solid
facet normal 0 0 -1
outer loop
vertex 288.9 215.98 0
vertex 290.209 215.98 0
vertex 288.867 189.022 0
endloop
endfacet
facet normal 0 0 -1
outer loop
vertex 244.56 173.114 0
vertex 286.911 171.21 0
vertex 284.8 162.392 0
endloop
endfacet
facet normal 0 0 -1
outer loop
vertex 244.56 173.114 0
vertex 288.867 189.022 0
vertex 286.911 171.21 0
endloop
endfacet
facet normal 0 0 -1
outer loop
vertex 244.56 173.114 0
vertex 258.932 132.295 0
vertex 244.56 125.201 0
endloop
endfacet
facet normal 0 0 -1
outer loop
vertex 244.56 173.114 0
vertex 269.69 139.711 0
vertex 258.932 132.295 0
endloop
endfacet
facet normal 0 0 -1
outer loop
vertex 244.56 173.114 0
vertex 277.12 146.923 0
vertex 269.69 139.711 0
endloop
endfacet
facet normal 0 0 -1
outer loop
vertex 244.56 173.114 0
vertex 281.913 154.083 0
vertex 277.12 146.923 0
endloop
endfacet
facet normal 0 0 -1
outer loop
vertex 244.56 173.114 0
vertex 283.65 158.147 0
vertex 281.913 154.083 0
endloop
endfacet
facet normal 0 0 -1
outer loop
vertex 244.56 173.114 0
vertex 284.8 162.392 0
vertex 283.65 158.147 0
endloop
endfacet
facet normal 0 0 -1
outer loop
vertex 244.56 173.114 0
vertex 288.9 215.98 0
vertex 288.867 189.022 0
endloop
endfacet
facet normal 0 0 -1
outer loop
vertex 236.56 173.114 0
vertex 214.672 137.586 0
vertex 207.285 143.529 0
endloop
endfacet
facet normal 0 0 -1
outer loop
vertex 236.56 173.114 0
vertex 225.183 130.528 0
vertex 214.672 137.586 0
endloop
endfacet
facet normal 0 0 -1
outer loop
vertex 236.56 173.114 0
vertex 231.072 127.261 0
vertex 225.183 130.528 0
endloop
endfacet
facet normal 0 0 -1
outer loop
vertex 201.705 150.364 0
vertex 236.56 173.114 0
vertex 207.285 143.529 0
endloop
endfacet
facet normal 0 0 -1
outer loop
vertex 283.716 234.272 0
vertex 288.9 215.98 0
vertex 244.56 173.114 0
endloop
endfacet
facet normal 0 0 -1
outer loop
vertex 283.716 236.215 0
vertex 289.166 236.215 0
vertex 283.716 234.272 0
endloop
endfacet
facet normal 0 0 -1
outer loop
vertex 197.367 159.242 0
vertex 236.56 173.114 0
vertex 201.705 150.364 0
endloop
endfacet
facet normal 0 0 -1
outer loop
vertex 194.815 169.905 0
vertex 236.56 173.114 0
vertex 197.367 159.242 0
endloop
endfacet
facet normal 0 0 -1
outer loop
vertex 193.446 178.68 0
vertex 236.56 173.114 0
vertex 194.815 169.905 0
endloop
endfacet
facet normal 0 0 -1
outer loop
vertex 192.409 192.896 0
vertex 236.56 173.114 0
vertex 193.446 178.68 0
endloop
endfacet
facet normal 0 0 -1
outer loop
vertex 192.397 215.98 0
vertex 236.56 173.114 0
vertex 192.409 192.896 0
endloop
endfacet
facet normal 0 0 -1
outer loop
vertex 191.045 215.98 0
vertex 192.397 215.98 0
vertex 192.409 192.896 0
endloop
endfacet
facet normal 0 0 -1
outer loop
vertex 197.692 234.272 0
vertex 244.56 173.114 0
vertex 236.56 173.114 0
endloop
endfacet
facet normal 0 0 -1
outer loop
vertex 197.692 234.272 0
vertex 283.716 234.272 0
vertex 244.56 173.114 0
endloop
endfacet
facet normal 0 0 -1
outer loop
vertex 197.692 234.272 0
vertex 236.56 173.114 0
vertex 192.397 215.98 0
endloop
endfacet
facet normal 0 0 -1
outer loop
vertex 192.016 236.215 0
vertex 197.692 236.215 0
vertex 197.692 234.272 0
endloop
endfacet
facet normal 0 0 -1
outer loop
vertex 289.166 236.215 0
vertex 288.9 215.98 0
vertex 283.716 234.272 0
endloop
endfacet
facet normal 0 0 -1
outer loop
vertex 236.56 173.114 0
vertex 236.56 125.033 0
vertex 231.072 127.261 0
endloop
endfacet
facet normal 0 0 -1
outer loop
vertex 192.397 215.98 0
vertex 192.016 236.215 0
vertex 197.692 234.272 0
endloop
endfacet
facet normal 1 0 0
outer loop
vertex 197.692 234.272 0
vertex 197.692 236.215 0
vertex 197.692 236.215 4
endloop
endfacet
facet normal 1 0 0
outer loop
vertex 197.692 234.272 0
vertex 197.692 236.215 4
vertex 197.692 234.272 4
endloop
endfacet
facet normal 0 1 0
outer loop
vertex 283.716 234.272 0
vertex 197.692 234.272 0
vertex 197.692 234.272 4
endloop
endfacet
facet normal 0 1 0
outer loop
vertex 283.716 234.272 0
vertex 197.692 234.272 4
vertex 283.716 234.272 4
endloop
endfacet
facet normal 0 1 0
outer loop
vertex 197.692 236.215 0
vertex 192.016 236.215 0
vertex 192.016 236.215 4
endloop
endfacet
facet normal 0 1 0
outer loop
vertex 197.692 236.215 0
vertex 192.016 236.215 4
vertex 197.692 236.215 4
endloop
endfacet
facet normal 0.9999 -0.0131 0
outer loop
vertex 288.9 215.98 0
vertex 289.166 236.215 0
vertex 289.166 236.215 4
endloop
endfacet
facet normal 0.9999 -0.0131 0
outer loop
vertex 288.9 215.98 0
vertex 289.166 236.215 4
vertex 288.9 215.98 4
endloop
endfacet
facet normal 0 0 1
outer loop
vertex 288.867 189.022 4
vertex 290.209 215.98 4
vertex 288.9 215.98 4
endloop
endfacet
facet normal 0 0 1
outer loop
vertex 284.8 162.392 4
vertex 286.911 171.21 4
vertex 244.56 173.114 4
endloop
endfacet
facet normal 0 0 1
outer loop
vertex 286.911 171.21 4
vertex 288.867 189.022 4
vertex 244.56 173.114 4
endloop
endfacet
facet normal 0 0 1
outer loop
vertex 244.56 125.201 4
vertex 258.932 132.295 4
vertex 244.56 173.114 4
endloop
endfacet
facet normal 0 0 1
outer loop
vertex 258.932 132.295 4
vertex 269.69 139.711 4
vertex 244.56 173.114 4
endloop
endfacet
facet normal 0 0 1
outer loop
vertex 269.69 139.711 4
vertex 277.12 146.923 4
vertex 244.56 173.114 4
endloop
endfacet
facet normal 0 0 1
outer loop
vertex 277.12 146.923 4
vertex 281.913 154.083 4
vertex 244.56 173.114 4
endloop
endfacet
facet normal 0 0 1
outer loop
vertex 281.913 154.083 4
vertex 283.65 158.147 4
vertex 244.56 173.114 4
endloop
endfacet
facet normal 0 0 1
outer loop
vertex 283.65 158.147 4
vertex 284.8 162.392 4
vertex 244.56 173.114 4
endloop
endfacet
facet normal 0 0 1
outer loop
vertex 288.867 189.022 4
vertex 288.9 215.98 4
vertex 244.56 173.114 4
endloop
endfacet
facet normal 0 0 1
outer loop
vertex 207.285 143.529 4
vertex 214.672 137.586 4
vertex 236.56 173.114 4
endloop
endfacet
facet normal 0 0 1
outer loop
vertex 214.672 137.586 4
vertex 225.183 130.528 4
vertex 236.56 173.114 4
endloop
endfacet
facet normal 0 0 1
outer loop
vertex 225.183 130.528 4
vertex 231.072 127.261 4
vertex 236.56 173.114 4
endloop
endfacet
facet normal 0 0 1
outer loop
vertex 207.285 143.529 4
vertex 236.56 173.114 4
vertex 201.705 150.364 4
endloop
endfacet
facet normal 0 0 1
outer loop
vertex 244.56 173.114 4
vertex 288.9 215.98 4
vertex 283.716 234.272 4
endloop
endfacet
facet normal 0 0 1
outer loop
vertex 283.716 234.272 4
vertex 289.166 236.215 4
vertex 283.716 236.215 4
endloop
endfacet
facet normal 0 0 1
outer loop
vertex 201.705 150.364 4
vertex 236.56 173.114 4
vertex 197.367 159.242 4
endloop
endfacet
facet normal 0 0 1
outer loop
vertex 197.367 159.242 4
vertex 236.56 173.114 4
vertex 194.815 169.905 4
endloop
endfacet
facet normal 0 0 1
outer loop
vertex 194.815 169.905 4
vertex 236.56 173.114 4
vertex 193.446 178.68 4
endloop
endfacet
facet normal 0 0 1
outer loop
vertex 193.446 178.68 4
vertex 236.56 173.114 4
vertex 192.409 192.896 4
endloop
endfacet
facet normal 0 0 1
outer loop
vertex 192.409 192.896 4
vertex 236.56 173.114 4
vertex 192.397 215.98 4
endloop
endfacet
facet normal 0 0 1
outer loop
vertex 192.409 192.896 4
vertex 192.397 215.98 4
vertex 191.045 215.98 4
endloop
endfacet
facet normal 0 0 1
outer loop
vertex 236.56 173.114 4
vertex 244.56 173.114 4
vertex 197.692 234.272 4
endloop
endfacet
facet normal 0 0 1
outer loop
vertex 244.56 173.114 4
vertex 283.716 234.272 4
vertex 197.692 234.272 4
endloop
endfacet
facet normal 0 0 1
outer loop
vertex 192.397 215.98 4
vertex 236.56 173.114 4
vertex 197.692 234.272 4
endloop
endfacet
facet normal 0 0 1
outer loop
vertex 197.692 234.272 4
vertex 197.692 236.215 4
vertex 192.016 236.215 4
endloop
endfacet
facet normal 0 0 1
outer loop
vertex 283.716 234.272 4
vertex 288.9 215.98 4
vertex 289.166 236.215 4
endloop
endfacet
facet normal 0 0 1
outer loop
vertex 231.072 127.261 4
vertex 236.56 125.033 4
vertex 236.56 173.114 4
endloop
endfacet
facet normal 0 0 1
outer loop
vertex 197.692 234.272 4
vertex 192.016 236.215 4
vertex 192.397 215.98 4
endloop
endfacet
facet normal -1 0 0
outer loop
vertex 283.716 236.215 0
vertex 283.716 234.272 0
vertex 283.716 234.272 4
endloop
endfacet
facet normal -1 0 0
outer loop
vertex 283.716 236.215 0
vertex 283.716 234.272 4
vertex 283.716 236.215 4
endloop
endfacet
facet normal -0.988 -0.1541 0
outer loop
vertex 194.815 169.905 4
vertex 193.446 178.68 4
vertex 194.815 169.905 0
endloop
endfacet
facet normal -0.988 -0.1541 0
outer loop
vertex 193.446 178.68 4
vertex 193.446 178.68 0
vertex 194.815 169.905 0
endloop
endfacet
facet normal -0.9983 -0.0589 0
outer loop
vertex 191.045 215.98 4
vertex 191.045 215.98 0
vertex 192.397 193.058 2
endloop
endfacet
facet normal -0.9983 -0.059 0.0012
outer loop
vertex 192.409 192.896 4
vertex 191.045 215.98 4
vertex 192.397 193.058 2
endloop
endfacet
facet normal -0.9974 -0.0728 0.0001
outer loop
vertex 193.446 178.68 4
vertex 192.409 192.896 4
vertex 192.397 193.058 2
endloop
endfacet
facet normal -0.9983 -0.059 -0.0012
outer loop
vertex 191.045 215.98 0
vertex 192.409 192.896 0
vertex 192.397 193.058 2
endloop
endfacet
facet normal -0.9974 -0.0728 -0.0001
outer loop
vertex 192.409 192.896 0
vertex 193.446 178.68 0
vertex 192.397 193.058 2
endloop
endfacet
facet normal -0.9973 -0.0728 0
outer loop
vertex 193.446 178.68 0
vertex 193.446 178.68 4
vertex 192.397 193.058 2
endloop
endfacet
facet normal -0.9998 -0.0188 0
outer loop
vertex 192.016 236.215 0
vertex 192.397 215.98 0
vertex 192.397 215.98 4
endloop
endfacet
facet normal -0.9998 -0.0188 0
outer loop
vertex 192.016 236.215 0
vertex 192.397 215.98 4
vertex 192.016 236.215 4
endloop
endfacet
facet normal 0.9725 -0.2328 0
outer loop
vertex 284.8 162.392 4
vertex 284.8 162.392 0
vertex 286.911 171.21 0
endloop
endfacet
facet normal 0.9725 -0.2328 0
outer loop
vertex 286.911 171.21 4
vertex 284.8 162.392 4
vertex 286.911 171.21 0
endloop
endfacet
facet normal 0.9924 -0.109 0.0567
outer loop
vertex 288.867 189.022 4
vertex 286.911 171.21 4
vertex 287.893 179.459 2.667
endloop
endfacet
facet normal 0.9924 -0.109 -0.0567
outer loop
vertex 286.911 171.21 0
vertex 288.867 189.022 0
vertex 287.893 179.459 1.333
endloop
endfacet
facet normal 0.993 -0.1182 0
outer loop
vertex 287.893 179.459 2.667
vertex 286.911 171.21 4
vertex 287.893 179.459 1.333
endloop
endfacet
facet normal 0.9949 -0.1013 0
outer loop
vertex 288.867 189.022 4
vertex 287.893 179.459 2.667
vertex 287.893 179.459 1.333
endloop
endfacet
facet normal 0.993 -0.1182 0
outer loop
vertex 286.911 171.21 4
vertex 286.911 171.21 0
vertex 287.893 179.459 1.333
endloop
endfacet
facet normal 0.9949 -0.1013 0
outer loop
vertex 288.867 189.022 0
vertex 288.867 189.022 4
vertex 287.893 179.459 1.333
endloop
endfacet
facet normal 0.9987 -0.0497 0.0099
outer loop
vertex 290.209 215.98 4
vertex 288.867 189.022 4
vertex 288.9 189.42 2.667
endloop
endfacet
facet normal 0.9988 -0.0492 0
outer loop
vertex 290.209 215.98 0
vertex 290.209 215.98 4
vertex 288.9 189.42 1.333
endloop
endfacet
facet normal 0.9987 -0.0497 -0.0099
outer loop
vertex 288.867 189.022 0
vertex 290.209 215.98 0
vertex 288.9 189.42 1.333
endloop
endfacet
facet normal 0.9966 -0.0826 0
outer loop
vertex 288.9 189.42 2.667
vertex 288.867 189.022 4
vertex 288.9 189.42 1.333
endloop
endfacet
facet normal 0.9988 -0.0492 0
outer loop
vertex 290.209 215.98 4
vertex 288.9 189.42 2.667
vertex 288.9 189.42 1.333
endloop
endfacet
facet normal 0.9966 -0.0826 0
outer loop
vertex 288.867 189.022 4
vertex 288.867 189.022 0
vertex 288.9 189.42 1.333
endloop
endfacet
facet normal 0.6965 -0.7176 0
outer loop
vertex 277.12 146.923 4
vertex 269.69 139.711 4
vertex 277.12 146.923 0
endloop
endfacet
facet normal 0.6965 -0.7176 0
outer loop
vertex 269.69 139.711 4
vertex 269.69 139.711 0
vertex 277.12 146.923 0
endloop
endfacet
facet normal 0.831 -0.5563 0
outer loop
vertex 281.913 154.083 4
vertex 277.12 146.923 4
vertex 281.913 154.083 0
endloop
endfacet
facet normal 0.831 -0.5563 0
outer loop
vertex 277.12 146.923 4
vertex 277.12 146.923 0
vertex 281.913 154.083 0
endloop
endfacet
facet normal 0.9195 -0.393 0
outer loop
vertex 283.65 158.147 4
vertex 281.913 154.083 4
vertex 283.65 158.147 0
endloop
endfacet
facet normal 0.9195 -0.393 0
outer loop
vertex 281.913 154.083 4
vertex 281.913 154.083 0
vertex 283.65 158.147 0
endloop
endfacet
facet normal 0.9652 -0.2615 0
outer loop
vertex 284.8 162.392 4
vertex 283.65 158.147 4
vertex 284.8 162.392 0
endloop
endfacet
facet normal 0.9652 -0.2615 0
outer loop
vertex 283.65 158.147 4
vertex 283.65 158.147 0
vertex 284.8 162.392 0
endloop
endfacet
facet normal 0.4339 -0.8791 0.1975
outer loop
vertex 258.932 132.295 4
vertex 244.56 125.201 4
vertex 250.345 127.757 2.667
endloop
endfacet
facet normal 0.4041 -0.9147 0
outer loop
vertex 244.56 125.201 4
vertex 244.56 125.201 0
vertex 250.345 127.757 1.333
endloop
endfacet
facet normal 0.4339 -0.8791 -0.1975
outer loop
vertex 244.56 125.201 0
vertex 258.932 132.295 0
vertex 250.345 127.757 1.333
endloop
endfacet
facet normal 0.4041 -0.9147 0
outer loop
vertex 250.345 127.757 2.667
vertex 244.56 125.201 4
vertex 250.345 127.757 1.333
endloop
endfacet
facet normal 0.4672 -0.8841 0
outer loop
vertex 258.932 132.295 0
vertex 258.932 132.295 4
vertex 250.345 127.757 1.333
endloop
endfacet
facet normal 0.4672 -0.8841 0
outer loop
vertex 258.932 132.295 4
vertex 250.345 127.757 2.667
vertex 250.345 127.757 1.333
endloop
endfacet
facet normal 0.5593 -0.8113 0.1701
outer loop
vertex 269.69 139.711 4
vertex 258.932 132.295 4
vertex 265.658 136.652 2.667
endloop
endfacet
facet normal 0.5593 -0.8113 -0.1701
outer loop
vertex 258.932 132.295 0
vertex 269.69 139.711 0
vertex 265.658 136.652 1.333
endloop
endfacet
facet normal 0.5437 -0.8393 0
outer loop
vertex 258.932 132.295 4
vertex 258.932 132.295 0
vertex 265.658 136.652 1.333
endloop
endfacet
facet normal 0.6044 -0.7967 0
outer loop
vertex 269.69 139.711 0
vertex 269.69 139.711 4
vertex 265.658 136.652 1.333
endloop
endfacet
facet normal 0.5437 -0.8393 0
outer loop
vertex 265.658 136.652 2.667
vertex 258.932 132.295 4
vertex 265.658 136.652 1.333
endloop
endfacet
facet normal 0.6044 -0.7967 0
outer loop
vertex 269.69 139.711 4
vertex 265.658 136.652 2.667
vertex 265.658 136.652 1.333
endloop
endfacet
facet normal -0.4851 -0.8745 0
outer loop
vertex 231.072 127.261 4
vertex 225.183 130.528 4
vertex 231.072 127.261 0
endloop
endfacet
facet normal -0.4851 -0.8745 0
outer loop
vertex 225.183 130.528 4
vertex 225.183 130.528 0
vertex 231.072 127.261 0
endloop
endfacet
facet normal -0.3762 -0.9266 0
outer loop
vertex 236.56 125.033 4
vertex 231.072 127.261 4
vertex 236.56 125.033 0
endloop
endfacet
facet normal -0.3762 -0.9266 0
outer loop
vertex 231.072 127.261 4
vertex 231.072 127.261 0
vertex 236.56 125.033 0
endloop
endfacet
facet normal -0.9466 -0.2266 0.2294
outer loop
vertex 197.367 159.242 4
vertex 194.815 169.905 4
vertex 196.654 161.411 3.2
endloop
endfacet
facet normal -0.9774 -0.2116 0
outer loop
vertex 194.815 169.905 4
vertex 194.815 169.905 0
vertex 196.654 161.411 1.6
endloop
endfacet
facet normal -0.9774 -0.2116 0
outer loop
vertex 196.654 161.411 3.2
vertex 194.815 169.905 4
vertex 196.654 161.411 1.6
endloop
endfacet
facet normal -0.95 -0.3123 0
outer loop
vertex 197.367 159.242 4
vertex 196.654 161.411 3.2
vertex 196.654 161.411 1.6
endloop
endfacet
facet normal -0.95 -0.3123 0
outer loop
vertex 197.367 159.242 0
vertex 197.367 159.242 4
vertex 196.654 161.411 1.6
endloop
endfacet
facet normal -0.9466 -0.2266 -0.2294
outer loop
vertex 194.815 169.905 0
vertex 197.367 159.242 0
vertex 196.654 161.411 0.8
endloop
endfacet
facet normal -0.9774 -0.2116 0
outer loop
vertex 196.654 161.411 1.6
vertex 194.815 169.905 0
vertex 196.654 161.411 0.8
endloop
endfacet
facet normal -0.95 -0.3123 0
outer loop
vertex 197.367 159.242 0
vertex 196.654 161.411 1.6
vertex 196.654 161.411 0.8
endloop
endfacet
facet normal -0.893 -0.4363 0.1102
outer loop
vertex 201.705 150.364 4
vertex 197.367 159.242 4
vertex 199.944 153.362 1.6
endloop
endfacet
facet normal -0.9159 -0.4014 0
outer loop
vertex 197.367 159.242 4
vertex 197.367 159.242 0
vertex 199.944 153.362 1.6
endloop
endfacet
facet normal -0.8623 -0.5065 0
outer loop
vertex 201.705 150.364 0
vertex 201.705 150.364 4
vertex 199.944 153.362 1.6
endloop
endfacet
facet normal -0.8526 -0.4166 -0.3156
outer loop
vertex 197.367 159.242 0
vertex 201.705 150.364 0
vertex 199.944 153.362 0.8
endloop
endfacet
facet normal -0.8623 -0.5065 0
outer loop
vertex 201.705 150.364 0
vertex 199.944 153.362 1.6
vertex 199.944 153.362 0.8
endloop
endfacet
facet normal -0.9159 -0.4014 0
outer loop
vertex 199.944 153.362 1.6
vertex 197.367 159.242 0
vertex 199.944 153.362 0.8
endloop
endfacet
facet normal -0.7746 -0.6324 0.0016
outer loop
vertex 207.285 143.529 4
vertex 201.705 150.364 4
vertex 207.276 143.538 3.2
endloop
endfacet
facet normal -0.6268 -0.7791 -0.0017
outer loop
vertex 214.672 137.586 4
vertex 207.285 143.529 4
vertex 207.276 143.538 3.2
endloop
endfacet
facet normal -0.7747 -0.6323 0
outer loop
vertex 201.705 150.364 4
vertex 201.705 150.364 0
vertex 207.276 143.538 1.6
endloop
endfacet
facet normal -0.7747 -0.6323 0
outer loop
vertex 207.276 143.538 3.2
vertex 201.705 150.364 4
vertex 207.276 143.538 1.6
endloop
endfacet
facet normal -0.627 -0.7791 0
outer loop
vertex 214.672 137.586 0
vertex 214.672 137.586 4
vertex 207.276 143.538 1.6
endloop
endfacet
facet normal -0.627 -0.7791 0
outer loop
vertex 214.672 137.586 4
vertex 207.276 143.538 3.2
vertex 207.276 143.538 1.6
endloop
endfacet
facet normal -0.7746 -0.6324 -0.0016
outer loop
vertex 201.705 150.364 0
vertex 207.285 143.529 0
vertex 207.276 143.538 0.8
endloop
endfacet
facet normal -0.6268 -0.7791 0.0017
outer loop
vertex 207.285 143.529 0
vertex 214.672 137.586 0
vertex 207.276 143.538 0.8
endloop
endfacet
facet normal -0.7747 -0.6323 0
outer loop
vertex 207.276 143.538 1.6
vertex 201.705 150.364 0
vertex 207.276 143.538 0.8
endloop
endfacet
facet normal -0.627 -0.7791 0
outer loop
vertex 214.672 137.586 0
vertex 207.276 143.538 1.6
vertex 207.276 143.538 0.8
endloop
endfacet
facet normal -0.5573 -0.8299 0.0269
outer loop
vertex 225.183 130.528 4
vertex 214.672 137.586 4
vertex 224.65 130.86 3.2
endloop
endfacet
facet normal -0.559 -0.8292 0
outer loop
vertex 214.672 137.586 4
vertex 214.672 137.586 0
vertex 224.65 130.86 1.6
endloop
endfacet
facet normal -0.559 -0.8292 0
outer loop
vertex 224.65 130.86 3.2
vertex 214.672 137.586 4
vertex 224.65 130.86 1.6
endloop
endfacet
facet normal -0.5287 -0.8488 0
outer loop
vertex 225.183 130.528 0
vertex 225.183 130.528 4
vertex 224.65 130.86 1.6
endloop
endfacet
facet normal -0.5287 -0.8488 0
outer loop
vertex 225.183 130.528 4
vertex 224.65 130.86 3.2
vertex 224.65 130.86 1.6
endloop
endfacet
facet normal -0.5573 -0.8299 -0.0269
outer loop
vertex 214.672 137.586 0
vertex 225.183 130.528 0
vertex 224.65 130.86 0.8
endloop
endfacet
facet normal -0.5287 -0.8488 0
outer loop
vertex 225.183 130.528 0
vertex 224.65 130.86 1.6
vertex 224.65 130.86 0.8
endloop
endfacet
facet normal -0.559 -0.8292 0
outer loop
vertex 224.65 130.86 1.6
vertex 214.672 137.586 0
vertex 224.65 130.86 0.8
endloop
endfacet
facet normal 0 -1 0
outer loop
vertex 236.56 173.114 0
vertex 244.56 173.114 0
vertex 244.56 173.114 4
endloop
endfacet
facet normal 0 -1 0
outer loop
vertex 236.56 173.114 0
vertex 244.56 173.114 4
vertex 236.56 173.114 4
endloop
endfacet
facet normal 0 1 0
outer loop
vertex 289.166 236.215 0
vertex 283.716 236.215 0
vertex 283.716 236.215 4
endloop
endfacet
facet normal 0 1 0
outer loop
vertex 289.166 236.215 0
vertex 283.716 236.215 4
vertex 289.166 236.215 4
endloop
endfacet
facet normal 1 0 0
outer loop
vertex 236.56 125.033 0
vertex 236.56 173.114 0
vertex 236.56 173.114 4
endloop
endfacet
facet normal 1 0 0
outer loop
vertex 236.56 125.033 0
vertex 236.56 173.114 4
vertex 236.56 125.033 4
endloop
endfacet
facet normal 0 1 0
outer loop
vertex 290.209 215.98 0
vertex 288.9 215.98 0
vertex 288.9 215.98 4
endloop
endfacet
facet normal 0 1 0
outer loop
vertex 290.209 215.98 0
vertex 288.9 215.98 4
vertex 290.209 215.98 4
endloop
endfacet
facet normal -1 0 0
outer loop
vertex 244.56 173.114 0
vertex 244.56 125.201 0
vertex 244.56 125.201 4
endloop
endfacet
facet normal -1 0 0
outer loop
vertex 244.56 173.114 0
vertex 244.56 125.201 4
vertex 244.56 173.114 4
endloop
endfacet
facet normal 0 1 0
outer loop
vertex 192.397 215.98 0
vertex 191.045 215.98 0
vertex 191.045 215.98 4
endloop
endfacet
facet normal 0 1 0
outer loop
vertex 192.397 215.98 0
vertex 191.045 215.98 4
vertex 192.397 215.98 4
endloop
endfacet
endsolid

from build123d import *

# Parameters (mm, degrees)
EXTRUDE_1_DEPTH = 4


with BuildPart() as part:
    # 草图1 → 凸台-拉伸1 (new body)
    with BuildSketch(Plane.XY):
        with BuildLine():
            Line((192.01570903, 236.215172683), (197.691755822, 236.215172683))
            Line((197.691755822, 236.215172683), (197.691755822, 234.272114968))
            Line((197.691755822, 234.272114968), (283.716181534, 234.272114968))
            Line((283.716181534, 234.272114968), (283.716181534, 236.215172683))
            Line((283.716181534, 236.215172683), (289.16648845, 236.215172683))
            Line((289.16648845, 236.215172683), (288.899951815, 215.97975226))
            Line((288.899951815, 215.97975226), (290.208767161, 215.97975226))
            add(Edge.make_bspline(
                [(284.799620172, 162.392429744), (286.759474849, 167.893462355), (287.57993928, 177.029821997), (289.649811574, 194.897723767), (289.52739364, 207.149942748), (290.208767161, 215.97975226)],
                knots=[0, 0, 0, 0, 0.321928336, 0.507408205, 1, 1, 1, 1], degree=3))
            add(Edge.make_bspline(
                [(244.559945218, 125.200650029), (246.510897062, 126.005562495), (253.842274844, 129.235901905), (270.285883988, 138.599536344), (282.598559802, 151.178754354), (284.799620172, 162.392429744)],
                knots=[0.030116407, 0.030116407, 0.030116407, 0.030116407, 0.138264507, 0.441021692, 1, 1, 1, 1], degree=3))
            Line((244.559945218, 125.200650029), (244.559945218, 169.113949314))
            Line((244.559945218, 169.113949314), (244.559945218, 173.113949314))
            Line((244.559945218, 173.113949314), (236.559945217, 173.113949314))
            Line((236.559945217, 173.113949314), (236.559945217, 169.113949314))
            Line((236.559945217, 169.113949314), (236.559945217, 125.032675044))
            add(Edge.make_bspline(
                [(194.814526021, 169.905399038), (195.610141371, 164.176898927), (198.346571661, 154.492253984), (207.021687023, 142.787448402), (216.390436057, 136.399663861), (225.951903337, 129.821011624), (232.271114311, 126.432484596), (236.559945217, 125.032675044)],
                knots=[0, 0, 0, 0, 0.262954959, 0.448389479, 0.647828965, 0.773904026, 0.974785001, 0.974785001, 0.974785001, 0.974785001], degree=3))
            add(Edge.make_bspline(
                [(191.044749595, 215.97975226), (190.906681757, 208.303976986), (192.789425639, 192.9807794), (193.135017556, 177.533691326), (194.814526021, 169.905399038)],
                knots=[0, 0, 0, 0, 0.496472492, 1, 1, 1, 1], degree=3))
            Line((191.044749595, 215.97975226), (192.397258047, 215.97975226))
            Line((192.397258047, 215.97975226), (192.01570903, 236.215172683))
        make_face()
    extrude(amount=EXTRUDE_1_DEPTH)


solid = part.part
